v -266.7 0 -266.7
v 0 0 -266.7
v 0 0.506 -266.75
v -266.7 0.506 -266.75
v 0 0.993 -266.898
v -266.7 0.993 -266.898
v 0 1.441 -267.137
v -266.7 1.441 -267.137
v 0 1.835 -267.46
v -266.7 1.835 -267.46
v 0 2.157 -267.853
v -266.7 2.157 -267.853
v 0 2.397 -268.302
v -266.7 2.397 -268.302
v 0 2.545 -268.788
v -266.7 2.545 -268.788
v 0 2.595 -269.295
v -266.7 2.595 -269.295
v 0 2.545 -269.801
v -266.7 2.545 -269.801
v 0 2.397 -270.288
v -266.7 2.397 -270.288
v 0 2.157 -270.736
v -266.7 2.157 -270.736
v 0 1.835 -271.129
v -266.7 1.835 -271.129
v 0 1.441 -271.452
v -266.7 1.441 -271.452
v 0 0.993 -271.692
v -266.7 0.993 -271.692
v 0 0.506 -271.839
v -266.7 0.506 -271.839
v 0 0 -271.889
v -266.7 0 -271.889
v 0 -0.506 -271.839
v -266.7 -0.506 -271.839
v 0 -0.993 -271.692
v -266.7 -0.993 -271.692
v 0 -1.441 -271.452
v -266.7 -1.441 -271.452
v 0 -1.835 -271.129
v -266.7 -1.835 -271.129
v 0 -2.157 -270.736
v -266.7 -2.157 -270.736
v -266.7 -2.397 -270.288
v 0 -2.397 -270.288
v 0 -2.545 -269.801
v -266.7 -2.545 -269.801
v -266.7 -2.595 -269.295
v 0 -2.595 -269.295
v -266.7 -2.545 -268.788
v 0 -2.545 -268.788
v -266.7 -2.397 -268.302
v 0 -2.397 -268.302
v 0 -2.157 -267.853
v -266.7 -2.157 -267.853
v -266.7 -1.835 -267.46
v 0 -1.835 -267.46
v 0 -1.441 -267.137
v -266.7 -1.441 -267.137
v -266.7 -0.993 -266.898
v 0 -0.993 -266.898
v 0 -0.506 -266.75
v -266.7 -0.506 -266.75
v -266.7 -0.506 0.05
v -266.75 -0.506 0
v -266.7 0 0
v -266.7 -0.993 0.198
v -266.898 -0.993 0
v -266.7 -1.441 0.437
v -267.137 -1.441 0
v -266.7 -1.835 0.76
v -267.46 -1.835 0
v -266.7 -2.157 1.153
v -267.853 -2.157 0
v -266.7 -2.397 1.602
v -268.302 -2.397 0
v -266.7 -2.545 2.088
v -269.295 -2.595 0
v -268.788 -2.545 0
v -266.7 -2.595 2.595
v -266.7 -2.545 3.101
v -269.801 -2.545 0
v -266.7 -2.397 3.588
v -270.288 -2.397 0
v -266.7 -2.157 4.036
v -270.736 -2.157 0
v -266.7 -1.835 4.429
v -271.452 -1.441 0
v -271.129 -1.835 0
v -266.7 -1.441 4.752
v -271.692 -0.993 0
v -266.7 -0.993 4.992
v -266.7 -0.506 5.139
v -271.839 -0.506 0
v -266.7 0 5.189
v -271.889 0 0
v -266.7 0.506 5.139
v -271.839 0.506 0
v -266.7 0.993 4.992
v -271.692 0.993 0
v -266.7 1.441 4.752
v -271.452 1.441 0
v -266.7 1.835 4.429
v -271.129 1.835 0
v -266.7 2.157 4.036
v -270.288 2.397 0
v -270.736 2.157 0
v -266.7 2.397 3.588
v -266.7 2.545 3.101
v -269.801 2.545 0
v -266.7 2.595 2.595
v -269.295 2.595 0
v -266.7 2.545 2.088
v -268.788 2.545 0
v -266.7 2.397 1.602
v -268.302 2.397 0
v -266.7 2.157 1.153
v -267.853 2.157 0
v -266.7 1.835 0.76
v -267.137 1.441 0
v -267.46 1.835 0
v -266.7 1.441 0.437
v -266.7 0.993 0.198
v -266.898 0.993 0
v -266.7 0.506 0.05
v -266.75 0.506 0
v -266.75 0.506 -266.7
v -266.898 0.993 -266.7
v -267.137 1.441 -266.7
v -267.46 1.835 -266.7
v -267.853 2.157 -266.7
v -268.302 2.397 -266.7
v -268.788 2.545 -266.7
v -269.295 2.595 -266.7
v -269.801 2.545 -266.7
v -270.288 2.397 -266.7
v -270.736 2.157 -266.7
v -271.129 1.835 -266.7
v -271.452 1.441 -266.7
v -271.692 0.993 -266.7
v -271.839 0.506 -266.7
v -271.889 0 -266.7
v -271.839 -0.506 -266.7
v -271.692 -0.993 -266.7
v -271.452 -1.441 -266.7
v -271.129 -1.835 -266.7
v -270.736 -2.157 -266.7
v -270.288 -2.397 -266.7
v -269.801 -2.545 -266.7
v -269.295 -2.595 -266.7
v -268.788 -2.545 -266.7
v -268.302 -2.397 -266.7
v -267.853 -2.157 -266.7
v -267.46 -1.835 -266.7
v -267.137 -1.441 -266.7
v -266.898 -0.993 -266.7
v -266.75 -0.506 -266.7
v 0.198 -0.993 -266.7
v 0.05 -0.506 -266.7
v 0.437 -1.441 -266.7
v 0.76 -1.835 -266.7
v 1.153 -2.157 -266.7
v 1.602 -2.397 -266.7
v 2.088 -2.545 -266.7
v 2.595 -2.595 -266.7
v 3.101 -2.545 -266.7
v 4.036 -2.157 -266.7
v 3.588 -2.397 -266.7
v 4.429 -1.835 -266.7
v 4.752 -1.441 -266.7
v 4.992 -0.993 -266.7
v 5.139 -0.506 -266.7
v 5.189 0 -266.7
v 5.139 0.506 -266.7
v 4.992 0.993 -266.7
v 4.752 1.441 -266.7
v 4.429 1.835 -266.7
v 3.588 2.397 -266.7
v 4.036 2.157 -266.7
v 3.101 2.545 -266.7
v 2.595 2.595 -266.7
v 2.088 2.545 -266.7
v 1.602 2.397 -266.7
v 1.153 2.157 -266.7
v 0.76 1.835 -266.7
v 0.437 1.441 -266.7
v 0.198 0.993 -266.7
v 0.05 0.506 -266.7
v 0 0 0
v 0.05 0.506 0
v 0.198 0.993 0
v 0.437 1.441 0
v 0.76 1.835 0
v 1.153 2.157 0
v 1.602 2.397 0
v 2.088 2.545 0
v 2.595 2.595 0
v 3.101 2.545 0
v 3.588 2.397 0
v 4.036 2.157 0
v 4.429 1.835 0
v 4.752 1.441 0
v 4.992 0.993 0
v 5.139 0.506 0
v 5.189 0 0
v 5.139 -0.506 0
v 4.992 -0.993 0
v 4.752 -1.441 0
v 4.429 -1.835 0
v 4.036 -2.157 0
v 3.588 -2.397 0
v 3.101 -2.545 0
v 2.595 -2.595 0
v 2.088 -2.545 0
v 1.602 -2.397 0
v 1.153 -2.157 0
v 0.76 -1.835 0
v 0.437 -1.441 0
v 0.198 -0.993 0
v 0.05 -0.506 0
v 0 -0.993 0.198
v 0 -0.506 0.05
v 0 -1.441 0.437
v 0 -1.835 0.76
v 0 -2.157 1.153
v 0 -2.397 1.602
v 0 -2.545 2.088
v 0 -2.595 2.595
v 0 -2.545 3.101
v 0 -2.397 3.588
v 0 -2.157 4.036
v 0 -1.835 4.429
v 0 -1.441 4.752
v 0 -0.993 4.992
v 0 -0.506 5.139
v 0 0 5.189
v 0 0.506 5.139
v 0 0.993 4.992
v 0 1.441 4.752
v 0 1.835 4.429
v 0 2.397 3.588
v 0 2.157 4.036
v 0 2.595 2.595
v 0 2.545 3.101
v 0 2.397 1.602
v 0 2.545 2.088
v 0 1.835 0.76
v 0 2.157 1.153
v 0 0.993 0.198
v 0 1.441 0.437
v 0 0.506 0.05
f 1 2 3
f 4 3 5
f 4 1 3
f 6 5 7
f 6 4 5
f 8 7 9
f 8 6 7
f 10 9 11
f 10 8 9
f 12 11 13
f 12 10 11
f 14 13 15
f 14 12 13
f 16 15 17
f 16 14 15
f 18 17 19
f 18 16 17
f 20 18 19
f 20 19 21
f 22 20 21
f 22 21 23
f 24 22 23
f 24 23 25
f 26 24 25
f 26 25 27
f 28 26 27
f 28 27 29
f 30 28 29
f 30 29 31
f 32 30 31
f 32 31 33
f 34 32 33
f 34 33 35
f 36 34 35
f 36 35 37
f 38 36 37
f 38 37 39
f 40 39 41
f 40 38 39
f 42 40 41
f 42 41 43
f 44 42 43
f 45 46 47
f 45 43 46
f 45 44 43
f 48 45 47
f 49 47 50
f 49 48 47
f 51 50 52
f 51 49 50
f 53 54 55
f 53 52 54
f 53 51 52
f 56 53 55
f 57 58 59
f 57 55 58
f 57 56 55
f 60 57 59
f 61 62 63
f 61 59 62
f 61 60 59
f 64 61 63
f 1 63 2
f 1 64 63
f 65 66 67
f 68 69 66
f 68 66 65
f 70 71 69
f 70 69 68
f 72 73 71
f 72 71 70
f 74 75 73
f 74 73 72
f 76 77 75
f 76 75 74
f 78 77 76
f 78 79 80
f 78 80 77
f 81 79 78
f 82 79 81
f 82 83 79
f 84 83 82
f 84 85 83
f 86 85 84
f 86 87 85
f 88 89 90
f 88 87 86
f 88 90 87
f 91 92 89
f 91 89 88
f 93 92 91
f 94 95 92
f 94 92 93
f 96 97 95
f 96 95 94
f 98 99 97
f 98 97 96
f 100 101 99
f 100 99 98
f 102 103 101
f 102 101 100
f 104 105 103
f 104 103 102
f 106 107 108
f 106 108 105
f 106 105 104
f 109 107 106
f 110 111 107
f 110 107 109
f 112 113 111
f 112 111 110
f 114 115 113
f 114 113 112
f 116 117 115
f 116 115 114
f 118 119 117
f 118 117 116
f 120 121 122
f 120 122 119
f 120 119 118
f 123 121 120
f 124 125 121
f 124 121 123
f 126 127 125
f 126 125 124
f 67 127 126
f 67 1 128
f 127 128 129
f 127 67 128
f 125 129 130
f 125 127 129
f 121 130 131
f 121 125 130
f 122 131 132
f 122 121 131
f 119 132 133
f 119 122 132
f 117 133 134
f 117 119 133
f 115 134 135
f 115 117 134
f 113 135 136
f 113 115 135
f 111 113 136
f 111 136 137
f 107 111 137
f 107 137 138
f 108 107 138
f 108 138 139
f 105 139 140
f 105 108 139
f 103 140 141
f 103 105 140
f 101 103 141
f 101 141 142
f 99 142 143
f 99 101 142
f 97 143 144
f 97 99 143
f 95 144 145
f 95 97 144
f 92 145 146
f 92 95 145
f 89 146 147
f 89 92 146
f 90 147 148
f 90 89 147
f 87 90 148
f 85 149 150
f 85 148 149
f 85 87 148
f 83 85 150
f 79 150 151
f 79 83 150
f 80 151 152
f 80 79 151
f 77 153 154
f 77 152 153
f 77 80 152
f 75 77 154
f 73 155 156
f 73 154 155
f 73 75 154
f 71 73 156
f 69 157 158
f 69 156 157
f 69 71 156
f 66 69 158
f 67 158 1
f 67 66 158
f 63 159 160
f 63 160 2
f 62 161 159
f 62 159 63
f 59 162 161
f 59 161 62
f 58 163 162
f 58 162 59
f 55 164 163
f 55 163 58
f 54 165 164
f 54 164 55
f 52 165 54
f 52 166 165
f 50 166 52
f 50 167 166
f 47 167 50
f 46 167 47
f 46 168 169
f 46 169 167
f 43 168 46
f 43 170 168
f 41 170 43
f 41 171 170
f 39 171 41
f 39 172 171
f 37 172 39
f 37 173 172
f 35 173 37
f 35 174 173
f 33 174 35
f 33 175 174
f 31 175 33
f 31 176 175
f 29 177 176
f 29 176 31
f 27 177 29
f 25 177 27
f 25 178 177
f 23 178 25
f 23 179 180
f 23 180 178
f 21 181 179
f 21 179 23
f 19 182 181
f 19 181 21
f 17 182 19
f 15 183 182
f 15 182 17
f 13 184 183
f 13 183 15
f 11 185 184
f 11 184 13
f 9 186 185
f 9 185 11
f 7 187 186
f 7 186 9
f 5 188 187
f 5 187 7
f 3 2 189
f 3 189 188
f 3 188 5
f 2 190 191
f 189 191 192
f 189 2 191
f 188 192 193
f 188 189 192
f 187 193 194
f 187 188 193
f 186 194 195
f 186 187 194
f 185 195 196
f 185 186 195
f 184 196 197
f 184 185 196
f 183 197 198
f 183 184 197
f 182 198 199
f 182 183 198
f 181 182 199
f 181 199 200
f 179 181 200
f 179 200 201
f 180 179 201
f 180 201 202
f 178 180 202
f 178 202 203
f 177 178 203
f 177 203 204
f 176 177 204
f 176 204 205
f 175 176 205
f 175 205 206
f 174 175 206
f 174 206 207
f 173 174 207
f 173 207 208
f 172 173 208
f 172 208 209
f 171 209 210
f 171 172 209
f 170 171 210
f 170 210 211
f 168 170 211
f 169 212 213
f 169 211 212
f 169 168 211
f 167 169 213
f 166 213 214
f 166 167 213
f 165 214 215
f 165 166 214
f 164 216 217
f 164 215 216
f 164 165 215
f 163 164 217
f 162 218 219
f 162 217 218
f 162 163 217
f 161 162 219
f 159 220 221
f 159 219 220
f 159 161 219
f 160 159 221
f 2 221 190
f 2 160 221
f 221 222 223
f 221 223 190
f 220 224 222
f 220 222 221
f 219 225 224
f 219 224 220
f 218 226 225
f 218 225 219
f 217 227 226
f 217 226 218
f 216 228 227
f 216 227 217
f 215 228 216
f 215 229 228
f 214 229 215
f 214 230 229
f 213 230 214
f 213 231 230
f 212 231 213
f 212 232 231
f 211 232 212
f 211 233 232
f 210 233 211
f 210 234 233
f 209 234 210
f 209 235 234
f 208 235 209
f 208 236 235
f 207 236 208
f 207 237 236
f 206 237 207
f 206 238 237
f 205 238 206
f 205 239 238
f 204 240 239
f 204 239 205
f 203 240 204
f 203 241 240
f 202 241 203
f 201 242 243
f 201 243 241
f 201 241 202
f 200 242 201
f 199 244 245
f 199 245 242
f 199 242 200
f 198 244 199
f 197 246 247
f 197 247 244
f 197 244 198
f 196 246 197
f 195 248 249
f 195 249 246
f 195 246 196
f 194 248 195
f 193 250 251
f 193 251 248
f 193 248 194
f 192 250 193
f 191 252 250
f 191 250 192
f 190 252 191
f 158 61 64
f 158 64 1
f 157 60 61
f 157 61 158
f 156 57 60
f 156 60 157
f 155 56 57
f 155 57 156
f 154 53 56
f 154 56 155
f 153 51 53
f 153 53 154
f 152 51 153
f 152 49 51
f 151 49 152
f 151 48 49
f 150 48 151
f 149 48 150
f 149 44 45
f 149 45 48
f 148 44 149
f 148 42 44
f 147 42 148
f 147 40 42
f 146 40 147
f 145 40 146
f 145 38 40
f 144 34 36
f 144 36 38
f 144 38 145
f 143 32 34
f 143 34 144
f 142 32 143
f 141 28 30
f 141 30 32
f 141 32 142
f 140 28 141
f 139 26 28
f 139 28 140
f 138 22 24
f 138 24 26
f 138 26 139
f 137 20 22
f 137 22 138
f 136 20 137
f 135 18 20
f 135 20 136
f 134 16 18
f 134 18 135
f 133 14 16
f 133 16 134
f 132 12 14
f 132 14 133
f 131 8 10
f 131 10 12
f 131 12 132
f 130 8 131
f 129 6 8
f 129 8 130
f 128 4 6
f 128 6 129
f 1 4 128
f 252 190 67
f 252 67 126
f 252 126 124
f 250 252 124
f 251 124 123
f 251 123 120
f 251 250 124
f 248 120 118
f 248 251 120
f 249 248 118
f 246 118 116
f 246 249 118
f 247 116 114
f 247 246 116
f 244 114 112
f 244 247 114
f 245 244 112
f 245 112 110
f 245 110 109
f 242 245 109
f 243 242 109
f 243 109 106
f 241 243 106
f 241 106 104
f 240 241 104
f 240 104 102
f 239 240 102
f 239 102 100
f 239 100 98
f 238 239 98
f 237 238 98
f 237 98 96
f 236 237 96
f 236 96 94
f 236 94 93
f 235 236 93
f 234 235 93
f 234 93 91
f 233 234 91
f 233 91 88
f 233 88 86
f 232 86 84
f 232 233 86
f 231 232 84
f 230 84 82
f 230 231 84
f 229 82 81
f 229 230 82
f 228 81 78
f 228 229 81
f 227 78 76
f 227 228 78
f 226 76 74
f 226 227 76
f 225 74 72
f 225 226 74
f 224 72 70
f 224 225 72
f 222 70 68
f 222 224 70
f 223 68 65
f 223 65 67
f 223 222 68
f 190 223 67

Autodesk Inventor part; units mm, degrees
ref_plane "YZ Plane" through (0, 0, 0) normal (1, 0, 0) x (0, 1, 0)
ref_plane "XZ Plane" through (0, 0, 0) normal (0, 1, 0) x (-1, 0, 0)
sketch "Sketch1" plane through (0, 0, 0) normal (0, 1, 0) x (-1, 0, 0)
  line L0 (0, 0) -> (266.7, 0)
  line L1 (266.7, 0) -> (266.7, -266.7)
  line L2 (266.7, -266.7) -> (0, -266.7)
  line L3 (0, -266.7) -> (0, 0)
  line L4 (-2.5946, 0) -> (-2.5946, -266.7)
  line L5 (0, -269.2946) -> (266.7, -269.2946)
  line L6 (269.2946, -266.7) -> (269.2946, 0)
  line L7 (266.7, 2.5946) -> (0, 2.5946)
  arc A0 (-2.5946, -266.7) -> (0, -269.2946) centre (0, -266.7) ccw
  arc A1 (266.7, -269.2946) -> (269.2946, -266.7) centre (266.7, -266.7) ccw
  arc A2 (269.2946, 0) -> (266.7, 2.5946) centre (266.7, 0) ccw
  arc A3 (0, 2.5946) -> (-2.5946, 0) centre (0, 0) ccw
  dimension "d1" = 2.5946
  dimension "d2" = 2.5946
  dimension "d3" = 2.5946
  dimension "d4" = 2.5946
  dimension "d5" = 2.5946
  dimension "d7" = 266.7
  dimension "d8" = 2.5946
ref_plane "Work Plane1" through (2.5946, 0, 0) normal (0, 0, -1) x (-1, 0, 0)
sketch "Sketch2" plane through (2.5946, 0, 0) normal (0, 0, -1) x (-1, 0, 0)
  circle A0 centre (0, 0) radius 2.5946
  point P0 (2.5946, 0)
  dimension "d9" = 5.1892
sweep "Sweep1" add profiles "Sketch2" path "Sketch1" path curves L4 A0 L5 A1 L6 A2 L7 A3
properties part number "Coil_Of_Wire" material "Copper"
